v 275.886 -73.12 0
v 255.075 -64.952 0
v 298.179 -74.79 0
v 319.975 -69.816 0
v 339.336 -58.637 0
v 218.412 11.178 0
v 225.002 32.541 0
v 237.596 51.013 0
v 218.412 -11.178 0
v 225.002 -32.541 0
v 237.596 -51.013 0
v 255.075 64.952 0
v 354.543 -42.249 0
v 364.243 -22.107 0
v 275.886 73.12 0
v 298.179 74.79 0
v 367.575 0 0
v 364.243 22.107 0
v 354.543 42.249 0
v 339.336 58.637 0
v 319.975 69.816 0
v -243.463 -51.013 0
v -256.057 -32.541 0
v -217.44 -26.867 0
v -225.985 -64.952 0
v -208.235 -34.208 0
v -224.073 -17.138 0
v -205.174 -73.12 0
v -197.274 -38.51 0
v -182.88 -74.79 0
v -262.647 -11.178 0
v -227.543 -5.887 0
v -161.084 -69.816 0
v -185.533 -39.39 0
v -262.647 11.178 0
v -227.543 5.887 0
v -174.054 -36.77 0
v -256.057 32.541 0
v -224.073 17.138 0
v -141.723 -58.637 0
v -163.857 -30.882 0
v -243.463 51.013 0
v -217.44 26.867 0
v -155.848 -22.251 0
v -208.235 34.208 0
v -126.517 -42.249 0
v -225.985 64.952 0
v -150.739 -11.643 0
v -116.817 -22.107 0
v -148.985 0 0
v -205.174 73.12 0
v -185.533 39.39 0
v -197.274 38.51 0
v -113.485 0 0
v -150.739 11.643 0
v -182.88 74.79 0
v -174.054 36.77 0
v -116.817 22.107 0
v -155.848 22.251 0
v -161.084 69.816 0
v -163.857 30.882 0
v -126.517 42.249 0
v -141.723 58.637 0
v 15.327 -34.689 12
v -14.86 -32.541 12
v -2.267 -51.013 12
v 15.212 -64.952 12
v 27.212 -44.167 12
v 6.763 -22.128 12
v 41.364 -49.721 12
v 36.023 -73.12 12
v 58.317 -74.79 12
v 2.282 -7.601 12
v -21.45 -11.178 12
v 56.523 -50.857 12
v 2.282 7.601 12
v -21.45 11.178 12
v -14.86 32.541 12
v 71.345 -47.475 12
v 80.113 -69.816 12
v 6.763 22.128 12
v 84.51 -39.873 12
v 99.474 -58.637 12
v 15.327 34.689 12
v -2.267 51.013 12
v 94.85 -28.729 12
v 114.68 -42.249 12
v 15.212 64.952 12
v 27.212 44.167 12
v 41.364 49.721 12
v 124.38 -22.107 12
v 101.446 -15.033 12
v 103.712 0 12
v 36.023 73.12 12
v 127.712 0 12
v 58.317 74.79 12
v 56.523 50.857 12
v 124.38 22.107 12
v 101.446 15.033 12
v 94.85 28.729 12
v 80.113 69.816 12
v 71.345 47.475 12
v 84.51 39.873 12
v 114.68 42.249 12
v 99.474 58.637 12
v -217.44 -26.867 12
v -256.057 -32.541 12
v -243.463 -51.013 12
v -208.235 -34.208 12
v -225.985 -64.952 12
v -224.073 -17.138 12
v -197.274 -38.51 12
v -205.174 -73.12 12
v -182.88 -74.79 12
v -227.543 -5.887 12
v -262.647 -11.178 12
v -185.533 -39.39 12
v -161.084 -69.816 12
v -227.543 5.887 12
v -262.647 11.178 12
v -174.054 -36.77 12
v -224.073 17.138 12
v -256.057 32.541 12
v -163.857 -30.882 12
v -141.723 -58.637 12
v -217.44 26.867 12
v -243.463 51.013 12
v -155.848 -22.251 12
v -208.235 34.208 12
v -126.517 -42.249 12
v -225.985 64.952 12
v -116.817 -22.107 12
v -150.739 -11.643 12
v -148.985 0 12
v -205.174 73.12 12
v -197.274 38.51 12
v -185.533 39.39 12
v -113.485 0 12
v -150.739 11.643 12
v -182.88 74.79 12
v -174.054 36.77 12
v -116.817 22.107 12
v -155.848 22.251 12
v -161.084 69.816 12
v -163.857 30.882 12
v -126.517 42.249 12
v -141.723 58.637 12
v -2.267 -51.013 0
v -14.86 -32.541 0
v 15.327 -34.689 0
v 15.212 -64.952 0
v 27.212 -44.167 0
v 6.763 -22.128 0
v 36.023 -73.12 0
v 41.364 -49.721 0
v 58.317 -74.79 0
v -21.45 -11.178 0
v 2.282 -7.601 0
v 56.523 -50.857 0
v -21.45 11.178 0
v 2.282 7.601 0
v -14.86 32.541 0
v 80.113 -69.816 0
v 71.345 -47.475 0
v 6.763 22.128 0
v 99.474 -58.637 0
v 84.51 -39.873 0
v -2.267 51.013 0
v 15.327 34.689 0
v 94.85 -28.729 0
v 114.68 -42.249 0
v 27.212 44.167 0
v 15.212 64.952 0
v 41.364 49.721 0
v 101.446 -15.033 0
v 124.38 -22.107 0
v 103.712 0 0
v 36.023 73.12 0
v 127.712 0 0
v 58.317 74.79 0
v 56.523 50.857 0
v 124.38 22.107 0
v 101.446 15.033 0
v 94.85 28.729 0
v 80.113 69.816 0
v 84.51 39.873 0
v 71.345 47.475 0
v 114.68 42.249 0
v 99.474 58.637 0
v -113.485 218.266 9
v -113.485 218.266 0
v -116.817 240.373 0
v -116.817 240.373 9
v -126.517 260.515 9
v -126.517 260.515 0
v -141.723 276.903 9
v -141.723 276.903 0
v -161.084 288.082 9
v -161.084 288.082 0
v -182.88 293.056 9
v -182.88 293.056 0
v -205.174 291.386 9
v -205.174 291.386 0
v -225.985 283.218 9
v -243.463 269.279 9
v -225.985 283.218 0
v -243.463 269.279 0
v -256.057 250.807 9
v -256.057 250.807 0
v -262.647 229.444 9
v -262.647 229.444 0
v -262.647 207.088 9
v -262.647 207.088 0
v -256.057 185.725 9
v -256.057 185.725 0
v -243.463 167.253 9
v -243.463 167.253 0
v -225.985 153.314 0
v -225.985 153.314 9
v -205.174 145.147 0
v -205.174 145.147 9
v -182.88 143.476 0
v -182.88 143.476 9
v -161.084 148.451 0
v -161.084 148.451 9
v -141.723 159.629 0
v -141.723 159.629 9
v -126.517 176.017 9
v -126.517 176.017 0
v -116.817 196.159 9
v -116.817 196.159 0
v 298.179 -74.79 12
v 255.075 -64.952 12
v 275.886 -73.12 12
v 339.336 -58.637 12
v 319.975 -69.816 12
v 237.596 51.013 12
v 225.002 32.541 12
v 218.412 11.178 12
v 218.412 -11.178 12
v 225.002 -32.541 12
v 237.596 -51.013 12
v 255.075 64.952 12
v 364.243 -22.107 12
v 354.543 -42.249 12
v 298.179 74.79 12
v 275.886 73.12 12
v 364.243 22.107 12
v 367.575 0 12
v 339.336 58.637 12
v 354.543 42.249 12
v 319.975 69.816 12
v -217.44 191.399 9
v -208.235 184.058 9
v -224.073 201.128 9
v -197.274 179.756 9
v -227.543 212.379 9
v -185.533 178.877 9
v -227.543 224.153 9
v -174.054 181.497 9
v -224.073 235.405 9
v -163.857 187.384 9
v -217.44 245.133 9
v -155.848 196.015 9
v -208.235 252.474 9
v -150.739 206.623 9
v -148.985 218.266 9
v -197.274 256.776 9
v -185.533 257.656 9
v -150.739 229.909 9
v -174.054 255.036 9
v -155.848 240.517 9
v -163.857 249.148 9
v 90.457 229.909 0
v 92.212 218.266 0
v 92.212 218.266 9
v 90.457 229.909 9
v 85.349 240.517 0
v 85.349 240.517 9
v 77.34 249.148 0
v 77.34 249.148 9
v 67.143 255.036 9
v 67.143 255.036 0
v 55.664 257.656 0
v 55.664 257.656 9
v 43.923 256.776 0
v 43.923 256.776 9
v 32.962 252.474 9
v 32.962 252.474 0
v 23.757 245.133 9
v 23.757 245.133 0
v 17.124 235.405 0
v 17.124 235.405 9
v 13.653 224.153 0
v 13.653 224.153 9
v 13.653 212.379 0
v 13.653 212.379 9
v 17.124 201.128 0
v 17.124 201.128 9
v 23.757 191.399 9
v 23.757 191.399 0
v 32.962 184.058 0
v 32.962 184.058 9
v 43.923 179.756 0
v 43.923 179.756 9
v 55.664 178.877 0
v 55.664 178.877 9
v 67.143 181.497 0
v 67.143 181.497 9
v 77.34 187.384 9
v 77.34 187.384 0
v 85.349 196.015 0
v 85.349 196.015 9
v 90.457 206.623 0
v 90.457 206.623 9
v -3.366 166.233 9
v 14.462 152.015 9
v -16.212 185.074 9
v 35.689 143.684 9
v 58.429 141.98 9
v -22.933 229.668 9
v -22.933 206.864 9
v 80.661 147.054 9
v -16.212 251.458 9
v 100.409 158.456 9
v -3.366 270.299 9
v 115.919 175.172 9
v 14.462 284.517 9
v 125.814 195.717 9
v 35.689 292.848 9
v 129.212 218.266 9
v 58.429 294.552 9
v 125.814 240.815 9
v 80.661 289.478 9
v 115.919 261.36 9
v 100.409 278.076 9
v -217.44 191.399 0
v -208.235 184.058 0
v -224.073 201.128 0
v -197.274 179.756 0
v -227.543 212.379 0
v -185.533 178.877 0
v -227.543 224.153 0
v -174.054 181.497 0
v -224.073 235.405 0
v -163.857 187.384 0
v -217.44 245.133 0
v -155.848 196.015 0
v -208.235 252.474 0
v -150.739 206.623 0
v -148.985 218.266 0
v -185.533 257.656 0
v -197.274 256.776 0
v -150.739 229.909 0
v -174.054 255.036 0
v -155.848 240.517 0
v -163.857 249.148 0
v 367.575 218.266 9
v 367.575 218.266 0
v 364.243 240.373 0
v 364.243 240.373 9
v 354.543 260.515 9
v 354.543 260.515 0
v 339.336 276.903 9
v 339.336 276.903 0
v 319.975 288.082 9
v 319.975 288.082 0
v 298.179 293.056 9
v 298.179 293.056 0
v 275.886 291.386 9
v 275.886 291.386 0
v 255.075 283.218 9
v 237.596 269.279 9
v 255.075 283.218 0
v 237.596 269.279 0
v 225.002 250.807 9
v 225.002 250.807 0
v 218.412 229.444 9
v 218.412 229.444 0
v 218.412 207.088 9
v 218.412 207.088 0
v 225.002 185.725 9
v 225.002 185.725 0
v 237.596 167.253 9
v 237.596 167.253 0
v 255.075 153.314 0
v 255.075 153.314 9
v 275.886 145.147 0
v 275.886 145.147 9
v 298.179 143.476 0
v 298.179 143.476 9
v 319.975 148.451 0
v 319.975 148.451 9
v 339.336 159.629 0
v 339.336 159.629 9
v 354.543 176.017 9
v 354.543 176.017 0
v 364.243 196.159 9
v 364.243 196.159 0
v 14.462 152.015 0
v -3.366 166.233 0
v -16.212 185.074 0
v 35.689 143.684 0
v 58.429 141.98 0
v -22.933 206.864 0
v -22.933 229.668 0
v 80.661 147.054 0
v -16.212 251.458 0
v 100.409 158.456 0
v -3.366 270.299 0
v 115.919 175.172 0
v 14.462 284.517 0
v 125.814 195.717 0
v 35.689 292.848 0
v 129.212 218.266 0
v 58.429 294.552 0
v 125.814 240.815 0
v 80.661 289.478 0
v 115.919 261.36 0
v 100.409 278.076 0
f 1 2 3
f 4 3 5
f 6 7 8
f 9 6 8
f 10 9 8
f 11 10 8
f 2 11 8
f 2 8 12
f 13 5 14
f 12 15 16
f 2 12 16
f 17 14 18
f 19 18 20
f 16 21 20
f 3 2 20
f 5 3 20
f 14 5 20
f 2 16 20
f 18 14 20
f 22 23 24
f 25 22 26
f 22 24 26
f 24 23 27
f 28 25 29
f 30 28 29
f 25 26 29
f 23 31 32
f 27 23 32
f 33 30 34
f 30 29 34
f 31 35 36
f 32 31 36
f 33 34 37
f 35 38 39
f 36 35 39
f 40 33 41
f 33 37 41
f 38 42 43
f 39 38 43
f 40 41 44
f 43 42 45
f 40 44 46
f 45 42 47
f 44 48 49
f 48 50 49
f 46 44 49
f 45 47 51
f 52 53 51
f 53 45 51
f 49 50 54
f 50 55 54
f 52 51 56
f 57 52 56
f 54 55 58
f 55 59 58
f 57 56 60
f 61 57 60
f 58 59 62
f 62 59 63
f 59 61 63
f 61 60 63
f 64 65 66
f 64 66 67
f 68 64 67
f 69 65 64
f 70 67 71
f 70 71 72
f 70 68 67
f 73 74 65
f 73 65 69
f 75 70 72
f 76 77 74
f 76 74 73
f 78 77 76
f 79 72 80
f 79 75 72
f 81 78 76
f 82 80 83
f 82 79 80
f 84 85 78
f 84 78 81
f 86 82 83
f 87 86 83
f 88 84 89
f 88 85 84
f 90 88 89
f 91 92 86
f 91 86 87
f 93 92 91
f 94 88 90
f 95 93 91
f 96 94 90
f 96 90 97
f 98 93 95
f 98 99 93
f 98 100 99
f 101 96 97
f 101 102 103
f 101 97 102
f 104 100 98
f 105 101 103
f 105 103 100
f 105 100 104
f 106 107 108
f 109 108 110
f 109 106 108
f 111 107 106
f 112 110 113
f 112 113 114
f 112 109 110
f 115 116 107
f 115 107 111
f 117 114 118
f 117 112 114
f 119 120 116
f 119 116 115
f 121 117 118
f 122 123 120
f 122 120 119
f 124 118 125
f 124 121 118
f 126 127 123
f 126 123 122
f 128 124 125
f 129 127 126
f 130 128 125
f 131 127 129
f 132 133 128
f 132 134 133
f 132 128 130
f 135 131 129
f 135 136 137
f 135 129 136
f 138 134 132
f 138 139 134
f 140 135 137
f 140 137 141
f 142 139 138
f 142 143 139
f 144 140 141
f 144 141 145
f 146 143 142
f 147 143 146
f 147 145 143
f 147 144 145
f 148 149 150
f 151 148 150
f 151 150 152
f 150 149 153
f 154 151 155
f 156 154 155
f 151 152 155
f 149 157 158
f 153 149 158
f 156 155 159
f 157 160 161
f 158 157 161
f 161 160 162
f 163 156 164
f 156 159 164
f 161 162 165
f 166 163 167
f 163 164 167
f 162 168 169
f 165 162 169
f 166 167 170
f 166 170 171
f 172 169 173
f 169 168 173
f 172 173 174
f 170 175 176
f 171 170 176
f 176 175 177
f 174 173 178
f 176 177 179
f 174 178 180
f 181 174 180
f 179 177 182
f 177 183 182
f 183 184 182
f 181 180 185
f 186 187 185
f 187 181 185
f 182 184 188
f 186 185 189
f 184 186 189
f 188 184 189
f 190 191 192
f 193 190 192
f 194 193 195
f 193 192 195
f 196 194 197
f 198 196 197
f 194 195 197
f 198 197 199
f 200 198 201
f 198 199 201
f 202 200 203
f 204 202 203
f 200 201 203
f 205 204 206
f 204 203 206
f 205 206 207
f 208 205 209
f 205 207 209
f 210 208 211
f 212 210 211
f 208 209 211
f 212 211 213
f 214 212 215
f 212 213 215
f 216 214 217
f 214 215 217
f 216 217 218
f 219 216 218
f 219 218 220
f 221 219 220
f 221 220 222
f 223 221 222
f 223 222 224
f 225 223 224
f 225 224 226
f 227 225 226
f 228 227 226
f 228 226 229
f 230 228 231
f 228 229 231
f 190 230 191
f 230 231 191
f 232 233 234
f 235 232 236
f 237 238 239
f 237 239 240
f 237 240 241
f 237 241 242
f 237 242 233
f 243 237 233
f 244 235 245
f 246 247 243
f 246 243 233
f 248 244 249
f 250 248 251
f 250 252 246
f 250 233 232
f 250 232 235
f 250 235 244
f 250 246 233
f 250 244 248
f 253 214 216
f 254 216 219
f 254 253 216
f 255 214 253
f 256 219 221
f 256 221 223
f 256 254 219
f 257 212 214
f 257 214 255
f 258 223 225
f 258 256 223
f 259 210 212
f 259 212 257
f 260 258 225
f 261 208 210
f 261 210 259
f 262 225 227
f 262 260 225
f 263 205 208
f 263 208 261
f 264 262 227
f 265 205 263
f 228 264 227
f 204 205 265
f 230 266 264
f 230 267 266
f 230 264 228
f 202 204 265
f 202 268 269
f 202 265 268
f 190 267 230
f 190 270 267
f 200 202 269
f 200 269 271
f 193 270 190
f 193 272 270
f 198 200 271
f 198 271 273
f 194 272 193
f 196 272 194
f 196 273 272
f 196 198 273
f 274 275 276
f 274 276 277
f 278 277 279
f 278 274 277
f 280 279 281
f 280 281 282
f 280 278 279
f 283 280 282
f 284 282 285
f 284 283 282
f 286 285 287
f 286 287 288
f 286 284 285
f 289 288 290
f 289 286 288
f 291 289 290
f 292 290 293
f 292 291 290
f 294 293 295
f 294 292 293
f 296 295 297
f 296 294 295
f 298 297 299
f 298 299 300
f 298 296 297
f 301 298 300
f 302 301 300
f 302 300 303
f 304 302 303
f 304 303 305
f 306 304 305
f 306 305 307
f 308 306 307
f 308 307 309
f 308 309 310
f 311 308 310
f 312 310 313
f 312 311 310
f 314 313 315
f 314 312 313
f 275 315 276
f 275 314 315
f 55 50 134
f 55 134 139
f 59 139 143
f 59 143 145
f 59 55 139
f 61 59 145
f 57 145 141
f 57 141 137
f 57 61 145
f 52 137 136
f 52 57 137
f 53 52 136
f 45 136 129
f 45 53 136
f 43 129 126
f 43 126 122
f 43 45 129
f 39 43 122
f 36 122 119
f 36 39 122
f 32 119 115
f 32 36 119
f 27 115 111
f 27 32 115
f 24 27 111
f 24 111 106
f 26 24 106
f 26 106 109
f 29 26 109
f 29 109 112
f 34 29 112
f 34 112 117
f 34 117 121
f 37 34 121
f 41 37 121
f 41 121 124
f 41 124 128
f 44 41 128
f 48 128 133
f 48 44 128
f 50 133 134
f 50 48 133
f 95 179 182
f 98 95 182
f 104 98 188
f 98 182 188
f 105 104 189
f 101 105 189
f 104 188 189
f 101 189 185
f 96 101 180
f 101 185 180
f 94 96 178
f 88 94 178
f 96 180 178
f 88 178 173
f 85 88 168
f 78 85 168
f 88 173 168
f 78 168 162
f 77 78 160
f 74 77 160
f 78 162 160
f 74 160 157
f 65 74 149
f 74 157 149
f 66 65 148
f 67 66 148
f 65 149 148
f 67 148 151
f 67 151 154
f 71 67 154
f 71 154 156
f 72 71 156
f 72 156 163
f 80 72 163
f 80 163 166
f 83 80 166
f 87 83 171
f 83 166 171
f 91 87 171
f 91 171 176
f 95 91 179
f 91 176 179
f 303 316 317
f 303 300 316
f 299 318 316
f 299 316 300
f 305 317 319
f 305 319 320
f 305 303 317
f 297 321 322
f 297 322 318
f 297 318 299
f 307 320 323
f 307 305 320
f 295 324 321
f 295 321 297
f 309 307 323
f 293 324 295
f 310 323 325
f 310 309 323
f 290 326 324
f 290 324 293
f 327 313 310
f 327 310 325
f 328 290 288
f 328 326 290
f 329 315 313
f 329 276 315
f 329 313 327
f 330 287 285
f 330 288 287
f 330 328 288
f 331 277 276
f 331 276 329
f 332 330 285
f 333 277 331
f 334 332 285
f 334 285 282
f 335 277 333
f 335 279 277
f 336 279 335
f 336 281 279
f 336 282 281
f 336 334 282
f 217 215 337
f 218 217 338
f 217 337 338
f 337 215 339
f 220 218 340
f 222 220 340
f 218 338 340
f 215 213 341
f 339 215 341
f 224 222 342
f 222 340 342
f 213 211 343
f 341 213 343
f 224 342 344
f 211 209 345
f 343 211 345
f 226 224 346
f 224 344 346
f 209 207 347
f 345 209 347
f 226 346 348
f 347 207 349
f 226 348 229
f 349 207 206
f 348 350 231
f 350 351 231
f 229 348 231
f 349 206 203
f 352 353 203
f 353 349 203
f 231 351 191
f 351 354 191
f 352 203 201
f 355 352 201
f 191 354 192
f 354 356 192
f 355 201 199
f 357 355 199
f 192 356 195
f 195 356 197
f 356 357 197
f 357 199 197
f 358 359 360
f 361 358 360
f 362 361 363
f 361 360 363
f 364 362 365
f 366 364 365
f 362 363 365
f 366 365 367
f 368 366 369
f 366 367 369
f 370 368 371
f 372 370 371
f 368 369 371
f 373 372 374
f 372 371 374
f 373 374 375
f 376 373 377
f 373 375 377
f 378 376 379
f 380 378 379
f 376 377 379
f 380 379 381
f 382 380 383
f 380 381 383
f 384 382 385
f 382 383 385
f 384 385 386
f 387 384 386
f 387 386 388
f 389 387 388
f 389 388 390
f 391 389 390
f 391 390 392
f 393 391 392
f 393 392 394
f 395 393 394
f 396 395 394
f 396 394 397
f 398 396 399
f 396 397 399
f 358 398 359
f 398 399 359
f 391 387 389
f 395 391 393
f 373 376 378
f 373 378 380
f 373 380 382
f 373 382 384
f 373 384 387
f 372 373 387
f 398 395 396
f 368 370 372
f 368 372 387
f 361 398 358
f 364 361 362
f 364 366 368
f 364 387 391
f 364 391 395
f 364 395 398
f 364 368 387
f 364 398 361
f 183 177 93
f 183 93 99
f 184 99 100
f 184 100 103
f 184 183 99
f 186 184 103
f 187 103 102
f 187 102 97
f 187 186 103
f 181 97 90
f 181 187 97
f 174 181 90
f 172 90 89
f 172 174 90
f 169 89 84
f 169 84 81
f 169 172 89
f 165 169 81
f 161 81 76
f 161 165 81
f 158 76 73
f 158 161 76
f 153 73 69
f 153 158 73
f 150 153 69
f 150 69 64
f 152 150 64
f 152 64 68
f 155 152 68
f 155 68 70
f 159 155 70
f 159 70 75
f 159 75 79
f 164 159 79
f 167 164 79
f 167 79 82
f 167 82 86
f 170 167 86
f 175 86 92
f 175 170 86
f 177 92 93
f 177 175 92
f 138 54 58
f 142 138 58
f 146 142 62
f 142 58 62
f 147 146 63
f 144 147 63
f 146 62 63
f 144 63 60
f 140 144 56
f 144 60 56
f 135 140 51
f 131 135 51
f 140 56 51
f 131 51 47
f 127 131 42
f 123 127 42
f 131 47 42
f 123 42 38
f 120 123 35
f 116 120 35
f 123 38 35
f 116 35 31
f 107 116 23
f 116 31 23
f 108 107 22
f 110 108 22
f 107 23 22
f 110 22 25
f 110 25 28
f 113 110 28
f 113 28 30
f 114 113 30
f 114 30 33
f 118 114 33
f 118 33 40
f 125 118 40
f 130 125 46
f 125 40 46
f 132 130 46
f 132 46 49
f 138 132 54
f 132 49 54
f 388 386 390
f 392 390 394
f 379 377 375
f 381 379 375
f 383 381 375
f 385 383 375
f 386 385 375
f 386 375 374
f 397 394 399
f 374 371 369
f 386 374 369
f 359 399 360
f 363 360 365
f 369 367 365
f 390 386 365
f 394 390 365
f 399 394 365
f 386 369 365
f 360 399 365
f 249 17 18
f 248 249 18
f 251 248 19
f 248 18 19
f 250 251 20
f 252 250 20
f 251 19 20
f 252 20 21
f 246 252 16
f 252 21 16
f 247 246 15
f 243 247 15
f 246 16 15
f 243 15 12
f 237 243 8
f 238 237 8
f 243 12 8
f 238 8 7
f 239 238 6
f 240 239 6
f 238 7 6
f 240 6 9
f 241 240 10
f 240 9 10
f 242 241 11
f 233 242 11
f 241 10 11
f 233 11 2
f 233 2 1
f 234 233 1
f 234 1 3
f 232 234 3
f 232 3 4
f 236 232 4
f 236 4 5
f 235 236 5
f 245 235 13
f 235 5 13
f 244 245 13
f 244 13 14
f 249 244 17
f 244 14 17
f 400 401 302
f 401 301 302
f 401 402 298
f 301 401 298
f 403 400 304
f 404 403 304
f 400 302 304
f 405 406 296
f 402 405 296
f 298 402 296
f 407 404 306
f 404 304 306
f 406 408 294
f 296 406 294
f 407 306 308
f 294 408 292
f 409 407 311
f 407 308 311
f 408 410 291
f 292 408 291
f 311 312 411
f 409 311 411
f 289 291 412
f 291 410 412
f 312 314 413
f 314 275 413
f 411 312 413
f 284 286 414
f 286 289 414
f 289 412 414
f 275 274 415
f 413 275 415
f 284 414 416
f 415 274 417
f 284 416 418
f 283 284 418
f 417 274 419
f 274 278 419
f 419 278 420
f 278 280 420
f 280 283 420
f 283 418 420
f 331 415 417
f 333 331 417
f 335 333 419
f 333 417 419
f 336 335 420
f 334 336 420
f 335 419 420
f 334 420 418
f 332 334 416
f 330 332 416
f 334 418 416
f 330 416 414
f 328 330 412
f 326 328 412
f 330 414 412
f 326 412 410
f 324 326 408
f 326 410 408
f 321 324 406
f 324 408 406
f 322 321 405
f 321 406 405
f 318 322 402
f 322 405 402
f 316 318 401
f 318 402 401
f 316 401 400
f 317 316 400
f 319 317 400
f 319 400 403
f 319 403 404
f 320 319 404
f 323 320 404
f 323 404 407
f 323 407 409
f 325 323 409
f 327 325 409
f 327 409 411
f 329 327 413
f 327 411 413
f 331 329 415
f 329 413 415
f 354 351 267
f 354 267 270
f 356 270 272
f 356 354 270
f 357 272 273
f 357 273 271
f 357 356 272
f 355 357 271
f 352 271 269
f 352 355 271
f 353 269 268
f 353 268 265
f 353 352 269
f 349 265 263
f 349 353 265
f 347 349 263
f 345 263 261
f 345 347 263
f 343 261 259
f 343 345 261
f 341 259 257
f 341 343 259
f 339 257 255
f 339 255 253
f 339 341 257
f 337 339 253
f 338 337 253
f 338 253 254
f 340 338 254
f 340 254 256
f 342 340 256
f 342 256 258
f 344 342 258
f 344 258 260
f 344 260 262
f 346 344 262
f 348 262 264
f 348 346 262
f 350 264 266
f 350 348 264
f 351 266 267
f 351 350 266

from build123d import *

# Parameters (mm, degrees)
F0_R      = 75
F0_R_2    = 39.5
F1_DEPTH  = 12
F2_R      = 75
F2_R_2    = 51
F3_DEPTH  = 12
F4_R      = 75
F4_R_2    = 39.5
F5_DEPTH  = 9
F6_R      = 75
F7_DEPTH  = 12
F8_R      = 76.5
F8_R_2    = 39.5
F9_DEPTH  = 9
F10_R     = 75
F11_DEPTH = 9


with BuildPart() as f1:
    # F0 (on Top) → F1 (new body)
    with BuildSketch(Plane.XY):
        with Locations((-188.484594, 0)):
            Circle(F0_R)
        with Locations((-188.484594, 0)):
            Circle(F0_R_2, mode=Mode.SUBTRACT)
    extrude(amount=F1_DEPTH)


with BuildPart() as f3:
    # F2 (on Top) → F3 (new body)
    with BuildSketch(Plane.XY):
        with Locations((52.712191, 0)):
            Circle(F2_R)
        with Locations((52.712191, 0)):
            Circle(F2_R_2, mode=Mode.SUBTRACT)
    extrude(amount=F3_DEPTH)


with BuildPart() as f5:
    # F4 (on Top) → F5 (new body)
    with BuildSketch(Plane.XY):
        with Locations((-188.484594, 218.26612)):
            Circle(F4_R)
        with Locations((-188.484594, 218.26612)):
            Circle(F4_R_2, mode=Mode.SUBTRACT)
    extrude(amount=F5_DEPTH)


with BuildPart() as f7:
    # F6 (on Top) → F7 (new body)
    with BuildSketch(Plane.XY):
        with Locations((292.574733, 0)):
            Circle(F6_R)
    extrude(amount=F7_DEPTH)


with BuildPart() as f9:
    # F8 (on Top) → F9 (new body)
    with BuildSketch(Plane.XY):
        with Locations((52.712191, 218.26612)):
            Circle(F8_R)
        with Locations((52.712191, 218.26612)):
            Circle(F8_R_2, mode=Mode.SUBTRACT)
    extrude(amount=F9_DEPTH)


with BuildPart() as f11:
    # F10 (on Top) → F11 (new body)
    with BuildSketch(Plane.XY):
        with Locations((292.574733, 218.26612)):
            Circle(F10_R)
    extrude(amount=F11_DEPTH)


solid = Compound([f1.part, f3.part, f5.part, f7.part, f9.part, f11.part])
